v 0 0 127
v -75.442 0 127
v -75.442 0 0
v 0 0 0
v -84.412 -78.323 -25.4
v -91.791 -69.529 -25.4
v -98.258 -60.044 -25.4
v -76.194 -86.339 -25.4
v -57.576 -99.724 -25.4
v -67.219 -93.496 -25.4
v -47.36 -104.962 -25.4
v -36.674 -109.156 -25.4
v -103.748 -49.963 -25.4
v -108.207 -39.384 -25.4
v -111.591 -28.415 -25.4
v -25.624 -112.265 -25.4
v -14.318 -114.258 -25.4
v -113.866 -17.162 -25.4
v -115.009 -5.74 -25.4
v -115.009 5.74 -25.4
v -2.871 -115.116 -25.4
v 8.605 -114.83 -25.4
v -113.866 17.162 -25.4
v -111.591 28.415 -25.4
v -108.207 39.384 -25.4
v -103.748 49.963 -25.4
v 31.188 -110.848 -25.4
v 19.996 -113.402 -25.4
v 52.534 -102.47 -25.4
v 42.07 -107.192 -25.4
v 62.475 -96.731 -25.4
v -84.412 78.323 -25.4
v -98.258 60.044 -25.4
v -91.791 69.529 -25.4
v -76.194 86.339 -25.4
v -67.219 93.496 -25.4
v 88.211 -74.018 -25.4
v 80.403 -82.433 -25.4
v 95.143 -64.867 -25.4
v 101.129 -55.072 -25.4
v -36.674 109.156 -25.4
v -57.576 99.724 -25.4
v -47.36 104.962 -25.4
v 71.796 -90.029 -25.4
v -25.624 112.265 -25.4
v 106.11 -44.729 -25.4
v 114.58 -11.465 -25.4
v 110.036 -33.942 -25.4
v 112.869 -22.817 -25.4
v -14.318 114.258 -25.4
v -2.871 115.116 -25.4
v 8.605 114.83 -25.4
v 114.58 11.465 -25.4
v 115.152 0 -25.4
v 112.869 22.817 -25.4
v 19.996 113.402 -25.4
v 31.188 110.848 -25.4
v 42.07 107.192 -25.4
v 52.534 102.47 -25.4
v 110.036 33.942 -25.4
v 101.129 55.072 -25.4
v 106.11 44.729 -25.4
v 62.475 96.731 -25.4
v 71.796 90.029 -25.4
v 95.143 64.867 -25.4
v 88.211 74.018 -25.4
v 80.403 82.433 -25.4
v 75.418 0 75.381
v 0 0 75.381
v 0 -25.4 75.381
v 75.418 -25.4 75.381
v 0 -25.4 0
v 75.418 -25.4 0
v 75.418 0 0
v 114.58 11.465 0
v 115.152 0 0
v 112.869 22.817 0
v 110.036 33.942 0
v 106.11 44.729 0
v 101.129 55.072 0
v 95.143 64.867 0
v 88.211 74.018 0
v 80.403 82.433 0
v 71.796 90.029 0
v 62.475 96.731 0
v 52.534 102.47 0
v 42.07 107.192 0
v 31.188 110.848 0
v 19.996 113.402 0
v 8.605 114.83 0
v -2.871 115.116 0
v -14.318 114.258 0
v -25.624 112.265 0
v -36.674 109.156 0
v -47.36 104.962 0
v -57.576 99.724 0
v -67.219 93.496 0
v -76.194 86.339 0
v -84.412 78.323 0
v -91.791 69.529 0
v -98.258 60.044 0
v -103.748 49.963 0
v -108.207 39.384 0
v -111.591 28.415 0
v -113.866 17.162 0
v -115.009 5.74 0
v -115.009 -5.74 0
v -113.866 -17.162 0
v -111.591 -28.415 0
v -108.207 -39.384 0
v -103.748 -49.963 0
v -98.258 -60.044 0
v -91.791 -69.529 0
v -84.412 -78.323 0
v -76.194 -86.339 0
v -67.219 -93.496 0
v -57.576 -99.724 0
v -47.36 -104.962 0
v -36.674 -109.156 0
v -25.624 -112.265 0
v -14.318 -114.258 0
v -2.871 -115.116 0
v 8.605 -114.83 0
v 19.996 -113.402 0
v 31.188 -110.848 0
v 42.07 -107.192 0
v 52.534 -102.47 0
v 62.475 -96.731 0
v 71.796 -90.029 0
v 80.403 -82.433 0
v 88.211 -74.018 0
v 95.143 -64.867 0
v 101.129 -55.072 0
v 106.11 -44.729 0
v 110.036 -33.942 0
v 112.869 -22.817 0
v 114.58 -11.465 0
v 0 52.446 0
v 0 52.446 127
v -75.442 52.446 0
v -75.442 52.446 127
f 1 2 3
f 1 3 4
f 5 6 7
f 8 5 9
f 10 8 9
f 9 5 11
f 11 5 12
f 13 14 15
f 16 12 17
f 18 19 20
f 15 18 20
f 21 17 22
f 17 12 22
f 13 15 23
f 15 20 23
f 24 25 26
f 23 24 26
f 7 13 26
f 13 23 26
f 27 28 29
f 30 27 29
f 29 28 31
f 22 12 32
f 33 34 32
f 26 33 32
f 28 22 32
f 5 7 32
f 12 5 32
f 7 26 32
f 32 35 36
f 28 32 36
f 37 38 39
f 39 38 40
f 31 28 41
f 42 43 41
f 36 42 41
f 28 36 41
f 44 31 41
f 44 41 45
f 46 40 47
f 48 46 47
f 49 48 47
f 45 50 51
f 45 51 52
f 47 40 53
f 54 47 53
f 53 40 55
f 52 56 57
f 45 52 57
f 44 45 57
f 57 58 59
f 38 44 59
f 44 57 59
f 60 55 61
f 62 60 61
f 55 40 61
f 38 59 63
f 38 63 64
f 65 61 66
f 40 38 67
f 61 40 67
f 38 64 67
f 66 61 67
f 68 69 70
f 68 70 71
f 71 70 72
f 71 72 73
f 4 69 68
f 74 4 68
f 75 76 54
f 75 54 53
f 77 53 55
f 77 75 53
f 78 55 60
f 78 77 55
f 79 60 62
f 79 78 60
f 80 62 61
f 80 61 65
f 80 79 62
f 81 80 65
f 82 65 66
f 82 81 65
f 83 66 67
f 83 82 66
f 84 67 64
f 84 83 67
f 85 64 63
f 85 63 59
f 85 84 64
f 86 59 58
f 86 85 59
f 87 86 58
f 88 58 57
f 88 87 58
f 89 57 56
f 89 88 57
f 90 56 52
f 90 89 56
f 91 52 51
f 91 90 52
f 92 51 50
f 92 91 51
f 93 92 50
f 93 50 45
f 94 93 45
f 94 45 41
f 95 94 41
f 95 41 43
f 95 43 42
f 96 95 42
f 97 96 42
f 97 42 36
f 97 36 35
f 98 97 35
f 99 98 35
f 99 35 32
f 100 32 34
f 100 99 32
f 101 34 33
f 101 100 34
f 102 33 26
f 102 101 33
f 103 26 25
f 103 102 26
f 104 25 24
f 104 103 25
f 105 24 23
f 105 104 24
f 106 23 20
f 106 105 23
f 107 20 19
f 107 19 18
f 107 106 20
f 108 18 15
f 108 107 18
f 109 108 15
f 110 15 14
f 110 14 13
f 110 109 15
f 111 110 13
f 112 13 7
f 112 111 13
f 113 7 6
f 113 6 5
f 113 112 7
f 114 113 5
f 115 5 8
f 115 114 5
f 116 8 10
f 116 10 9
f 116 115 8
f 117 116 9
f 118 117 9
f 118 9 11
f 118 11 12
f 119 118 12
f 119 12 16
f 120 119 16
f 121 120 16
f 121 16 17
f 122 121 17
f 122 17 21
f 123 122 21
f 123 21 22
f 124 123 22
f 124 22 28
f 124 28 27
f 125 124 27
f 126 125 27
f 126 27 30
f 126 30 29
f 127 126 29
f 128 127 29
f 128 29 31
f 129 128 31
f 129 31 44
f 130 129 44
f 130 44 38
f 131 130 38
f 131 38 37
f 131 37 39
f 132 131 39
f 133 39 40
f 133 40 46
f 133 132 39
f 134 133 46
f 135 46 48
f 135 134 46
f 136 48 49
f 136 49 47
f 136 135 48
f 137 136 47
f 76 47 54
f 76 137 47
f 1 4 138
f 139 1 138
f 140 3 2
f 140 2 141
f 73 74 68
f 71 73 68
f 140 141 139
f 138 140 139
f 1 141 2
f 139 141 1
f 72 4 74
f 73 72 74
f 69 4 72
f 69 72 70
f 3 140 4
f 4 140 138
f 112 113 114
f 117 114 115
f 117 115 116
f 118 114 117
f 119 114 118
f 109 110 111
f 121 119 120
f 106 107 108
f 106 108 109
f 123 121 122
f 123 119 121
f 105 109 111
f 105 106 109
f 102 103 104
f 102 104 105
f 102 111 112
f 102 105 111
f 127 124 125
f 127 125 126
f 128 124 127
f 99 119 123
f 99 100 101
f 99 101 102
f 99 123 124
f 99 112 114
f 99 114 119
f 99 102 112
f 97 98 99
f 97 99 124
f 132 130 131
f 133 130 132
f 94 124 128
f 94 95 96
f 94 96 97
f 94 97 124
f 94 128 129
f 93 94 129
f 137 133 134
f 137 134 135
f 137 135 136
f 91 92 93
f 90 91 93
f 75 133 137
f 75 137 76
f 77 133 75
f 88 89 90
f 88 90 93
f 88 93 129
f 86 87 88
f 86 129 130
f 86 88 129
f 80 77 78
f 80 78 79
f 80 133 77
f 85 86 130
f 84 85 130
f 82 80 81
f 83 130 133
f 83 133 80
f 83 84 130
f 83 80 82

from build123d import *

# Parameters (mm, degrees)
F0_W     = 75.417697
F0_H     = 75.381391
F1_DEPTH = 25.4
F2_W     = 75.442411
F2_H     = 52.446492
F3_DEPTH = 127
F4_R     = 115.151898
F5_DEPTH = 25.4


with BuildPart() as f1:
    # F0 (on Front) → F1 (new body)
    with BuildSketch(Plane.XZ):
        with Locations((37.708848, 37.690695)):
            Rectangle(F0_W, F0_H)
    extrude(amount=F1_DEPTH)


with BuildPart() as f3:
    # F2 (on Top) → F3 (new body)
    with BuildSketch(Plane.XY):
        with Locations((-37.721205, 26.223246)):
            Rectangle(F2_W, F2_H)
    extrude(amount=F3_DEPTH)


with BuildPart() as f5:
    # F4 (on Top) → F5 (new body)
    with BuildSketch(Plane.XY):
        Circle(F4_R)
    extrude(amount=-F5_DEPTH)


solid = Compound([f1.part, f3.part, f5.part])
